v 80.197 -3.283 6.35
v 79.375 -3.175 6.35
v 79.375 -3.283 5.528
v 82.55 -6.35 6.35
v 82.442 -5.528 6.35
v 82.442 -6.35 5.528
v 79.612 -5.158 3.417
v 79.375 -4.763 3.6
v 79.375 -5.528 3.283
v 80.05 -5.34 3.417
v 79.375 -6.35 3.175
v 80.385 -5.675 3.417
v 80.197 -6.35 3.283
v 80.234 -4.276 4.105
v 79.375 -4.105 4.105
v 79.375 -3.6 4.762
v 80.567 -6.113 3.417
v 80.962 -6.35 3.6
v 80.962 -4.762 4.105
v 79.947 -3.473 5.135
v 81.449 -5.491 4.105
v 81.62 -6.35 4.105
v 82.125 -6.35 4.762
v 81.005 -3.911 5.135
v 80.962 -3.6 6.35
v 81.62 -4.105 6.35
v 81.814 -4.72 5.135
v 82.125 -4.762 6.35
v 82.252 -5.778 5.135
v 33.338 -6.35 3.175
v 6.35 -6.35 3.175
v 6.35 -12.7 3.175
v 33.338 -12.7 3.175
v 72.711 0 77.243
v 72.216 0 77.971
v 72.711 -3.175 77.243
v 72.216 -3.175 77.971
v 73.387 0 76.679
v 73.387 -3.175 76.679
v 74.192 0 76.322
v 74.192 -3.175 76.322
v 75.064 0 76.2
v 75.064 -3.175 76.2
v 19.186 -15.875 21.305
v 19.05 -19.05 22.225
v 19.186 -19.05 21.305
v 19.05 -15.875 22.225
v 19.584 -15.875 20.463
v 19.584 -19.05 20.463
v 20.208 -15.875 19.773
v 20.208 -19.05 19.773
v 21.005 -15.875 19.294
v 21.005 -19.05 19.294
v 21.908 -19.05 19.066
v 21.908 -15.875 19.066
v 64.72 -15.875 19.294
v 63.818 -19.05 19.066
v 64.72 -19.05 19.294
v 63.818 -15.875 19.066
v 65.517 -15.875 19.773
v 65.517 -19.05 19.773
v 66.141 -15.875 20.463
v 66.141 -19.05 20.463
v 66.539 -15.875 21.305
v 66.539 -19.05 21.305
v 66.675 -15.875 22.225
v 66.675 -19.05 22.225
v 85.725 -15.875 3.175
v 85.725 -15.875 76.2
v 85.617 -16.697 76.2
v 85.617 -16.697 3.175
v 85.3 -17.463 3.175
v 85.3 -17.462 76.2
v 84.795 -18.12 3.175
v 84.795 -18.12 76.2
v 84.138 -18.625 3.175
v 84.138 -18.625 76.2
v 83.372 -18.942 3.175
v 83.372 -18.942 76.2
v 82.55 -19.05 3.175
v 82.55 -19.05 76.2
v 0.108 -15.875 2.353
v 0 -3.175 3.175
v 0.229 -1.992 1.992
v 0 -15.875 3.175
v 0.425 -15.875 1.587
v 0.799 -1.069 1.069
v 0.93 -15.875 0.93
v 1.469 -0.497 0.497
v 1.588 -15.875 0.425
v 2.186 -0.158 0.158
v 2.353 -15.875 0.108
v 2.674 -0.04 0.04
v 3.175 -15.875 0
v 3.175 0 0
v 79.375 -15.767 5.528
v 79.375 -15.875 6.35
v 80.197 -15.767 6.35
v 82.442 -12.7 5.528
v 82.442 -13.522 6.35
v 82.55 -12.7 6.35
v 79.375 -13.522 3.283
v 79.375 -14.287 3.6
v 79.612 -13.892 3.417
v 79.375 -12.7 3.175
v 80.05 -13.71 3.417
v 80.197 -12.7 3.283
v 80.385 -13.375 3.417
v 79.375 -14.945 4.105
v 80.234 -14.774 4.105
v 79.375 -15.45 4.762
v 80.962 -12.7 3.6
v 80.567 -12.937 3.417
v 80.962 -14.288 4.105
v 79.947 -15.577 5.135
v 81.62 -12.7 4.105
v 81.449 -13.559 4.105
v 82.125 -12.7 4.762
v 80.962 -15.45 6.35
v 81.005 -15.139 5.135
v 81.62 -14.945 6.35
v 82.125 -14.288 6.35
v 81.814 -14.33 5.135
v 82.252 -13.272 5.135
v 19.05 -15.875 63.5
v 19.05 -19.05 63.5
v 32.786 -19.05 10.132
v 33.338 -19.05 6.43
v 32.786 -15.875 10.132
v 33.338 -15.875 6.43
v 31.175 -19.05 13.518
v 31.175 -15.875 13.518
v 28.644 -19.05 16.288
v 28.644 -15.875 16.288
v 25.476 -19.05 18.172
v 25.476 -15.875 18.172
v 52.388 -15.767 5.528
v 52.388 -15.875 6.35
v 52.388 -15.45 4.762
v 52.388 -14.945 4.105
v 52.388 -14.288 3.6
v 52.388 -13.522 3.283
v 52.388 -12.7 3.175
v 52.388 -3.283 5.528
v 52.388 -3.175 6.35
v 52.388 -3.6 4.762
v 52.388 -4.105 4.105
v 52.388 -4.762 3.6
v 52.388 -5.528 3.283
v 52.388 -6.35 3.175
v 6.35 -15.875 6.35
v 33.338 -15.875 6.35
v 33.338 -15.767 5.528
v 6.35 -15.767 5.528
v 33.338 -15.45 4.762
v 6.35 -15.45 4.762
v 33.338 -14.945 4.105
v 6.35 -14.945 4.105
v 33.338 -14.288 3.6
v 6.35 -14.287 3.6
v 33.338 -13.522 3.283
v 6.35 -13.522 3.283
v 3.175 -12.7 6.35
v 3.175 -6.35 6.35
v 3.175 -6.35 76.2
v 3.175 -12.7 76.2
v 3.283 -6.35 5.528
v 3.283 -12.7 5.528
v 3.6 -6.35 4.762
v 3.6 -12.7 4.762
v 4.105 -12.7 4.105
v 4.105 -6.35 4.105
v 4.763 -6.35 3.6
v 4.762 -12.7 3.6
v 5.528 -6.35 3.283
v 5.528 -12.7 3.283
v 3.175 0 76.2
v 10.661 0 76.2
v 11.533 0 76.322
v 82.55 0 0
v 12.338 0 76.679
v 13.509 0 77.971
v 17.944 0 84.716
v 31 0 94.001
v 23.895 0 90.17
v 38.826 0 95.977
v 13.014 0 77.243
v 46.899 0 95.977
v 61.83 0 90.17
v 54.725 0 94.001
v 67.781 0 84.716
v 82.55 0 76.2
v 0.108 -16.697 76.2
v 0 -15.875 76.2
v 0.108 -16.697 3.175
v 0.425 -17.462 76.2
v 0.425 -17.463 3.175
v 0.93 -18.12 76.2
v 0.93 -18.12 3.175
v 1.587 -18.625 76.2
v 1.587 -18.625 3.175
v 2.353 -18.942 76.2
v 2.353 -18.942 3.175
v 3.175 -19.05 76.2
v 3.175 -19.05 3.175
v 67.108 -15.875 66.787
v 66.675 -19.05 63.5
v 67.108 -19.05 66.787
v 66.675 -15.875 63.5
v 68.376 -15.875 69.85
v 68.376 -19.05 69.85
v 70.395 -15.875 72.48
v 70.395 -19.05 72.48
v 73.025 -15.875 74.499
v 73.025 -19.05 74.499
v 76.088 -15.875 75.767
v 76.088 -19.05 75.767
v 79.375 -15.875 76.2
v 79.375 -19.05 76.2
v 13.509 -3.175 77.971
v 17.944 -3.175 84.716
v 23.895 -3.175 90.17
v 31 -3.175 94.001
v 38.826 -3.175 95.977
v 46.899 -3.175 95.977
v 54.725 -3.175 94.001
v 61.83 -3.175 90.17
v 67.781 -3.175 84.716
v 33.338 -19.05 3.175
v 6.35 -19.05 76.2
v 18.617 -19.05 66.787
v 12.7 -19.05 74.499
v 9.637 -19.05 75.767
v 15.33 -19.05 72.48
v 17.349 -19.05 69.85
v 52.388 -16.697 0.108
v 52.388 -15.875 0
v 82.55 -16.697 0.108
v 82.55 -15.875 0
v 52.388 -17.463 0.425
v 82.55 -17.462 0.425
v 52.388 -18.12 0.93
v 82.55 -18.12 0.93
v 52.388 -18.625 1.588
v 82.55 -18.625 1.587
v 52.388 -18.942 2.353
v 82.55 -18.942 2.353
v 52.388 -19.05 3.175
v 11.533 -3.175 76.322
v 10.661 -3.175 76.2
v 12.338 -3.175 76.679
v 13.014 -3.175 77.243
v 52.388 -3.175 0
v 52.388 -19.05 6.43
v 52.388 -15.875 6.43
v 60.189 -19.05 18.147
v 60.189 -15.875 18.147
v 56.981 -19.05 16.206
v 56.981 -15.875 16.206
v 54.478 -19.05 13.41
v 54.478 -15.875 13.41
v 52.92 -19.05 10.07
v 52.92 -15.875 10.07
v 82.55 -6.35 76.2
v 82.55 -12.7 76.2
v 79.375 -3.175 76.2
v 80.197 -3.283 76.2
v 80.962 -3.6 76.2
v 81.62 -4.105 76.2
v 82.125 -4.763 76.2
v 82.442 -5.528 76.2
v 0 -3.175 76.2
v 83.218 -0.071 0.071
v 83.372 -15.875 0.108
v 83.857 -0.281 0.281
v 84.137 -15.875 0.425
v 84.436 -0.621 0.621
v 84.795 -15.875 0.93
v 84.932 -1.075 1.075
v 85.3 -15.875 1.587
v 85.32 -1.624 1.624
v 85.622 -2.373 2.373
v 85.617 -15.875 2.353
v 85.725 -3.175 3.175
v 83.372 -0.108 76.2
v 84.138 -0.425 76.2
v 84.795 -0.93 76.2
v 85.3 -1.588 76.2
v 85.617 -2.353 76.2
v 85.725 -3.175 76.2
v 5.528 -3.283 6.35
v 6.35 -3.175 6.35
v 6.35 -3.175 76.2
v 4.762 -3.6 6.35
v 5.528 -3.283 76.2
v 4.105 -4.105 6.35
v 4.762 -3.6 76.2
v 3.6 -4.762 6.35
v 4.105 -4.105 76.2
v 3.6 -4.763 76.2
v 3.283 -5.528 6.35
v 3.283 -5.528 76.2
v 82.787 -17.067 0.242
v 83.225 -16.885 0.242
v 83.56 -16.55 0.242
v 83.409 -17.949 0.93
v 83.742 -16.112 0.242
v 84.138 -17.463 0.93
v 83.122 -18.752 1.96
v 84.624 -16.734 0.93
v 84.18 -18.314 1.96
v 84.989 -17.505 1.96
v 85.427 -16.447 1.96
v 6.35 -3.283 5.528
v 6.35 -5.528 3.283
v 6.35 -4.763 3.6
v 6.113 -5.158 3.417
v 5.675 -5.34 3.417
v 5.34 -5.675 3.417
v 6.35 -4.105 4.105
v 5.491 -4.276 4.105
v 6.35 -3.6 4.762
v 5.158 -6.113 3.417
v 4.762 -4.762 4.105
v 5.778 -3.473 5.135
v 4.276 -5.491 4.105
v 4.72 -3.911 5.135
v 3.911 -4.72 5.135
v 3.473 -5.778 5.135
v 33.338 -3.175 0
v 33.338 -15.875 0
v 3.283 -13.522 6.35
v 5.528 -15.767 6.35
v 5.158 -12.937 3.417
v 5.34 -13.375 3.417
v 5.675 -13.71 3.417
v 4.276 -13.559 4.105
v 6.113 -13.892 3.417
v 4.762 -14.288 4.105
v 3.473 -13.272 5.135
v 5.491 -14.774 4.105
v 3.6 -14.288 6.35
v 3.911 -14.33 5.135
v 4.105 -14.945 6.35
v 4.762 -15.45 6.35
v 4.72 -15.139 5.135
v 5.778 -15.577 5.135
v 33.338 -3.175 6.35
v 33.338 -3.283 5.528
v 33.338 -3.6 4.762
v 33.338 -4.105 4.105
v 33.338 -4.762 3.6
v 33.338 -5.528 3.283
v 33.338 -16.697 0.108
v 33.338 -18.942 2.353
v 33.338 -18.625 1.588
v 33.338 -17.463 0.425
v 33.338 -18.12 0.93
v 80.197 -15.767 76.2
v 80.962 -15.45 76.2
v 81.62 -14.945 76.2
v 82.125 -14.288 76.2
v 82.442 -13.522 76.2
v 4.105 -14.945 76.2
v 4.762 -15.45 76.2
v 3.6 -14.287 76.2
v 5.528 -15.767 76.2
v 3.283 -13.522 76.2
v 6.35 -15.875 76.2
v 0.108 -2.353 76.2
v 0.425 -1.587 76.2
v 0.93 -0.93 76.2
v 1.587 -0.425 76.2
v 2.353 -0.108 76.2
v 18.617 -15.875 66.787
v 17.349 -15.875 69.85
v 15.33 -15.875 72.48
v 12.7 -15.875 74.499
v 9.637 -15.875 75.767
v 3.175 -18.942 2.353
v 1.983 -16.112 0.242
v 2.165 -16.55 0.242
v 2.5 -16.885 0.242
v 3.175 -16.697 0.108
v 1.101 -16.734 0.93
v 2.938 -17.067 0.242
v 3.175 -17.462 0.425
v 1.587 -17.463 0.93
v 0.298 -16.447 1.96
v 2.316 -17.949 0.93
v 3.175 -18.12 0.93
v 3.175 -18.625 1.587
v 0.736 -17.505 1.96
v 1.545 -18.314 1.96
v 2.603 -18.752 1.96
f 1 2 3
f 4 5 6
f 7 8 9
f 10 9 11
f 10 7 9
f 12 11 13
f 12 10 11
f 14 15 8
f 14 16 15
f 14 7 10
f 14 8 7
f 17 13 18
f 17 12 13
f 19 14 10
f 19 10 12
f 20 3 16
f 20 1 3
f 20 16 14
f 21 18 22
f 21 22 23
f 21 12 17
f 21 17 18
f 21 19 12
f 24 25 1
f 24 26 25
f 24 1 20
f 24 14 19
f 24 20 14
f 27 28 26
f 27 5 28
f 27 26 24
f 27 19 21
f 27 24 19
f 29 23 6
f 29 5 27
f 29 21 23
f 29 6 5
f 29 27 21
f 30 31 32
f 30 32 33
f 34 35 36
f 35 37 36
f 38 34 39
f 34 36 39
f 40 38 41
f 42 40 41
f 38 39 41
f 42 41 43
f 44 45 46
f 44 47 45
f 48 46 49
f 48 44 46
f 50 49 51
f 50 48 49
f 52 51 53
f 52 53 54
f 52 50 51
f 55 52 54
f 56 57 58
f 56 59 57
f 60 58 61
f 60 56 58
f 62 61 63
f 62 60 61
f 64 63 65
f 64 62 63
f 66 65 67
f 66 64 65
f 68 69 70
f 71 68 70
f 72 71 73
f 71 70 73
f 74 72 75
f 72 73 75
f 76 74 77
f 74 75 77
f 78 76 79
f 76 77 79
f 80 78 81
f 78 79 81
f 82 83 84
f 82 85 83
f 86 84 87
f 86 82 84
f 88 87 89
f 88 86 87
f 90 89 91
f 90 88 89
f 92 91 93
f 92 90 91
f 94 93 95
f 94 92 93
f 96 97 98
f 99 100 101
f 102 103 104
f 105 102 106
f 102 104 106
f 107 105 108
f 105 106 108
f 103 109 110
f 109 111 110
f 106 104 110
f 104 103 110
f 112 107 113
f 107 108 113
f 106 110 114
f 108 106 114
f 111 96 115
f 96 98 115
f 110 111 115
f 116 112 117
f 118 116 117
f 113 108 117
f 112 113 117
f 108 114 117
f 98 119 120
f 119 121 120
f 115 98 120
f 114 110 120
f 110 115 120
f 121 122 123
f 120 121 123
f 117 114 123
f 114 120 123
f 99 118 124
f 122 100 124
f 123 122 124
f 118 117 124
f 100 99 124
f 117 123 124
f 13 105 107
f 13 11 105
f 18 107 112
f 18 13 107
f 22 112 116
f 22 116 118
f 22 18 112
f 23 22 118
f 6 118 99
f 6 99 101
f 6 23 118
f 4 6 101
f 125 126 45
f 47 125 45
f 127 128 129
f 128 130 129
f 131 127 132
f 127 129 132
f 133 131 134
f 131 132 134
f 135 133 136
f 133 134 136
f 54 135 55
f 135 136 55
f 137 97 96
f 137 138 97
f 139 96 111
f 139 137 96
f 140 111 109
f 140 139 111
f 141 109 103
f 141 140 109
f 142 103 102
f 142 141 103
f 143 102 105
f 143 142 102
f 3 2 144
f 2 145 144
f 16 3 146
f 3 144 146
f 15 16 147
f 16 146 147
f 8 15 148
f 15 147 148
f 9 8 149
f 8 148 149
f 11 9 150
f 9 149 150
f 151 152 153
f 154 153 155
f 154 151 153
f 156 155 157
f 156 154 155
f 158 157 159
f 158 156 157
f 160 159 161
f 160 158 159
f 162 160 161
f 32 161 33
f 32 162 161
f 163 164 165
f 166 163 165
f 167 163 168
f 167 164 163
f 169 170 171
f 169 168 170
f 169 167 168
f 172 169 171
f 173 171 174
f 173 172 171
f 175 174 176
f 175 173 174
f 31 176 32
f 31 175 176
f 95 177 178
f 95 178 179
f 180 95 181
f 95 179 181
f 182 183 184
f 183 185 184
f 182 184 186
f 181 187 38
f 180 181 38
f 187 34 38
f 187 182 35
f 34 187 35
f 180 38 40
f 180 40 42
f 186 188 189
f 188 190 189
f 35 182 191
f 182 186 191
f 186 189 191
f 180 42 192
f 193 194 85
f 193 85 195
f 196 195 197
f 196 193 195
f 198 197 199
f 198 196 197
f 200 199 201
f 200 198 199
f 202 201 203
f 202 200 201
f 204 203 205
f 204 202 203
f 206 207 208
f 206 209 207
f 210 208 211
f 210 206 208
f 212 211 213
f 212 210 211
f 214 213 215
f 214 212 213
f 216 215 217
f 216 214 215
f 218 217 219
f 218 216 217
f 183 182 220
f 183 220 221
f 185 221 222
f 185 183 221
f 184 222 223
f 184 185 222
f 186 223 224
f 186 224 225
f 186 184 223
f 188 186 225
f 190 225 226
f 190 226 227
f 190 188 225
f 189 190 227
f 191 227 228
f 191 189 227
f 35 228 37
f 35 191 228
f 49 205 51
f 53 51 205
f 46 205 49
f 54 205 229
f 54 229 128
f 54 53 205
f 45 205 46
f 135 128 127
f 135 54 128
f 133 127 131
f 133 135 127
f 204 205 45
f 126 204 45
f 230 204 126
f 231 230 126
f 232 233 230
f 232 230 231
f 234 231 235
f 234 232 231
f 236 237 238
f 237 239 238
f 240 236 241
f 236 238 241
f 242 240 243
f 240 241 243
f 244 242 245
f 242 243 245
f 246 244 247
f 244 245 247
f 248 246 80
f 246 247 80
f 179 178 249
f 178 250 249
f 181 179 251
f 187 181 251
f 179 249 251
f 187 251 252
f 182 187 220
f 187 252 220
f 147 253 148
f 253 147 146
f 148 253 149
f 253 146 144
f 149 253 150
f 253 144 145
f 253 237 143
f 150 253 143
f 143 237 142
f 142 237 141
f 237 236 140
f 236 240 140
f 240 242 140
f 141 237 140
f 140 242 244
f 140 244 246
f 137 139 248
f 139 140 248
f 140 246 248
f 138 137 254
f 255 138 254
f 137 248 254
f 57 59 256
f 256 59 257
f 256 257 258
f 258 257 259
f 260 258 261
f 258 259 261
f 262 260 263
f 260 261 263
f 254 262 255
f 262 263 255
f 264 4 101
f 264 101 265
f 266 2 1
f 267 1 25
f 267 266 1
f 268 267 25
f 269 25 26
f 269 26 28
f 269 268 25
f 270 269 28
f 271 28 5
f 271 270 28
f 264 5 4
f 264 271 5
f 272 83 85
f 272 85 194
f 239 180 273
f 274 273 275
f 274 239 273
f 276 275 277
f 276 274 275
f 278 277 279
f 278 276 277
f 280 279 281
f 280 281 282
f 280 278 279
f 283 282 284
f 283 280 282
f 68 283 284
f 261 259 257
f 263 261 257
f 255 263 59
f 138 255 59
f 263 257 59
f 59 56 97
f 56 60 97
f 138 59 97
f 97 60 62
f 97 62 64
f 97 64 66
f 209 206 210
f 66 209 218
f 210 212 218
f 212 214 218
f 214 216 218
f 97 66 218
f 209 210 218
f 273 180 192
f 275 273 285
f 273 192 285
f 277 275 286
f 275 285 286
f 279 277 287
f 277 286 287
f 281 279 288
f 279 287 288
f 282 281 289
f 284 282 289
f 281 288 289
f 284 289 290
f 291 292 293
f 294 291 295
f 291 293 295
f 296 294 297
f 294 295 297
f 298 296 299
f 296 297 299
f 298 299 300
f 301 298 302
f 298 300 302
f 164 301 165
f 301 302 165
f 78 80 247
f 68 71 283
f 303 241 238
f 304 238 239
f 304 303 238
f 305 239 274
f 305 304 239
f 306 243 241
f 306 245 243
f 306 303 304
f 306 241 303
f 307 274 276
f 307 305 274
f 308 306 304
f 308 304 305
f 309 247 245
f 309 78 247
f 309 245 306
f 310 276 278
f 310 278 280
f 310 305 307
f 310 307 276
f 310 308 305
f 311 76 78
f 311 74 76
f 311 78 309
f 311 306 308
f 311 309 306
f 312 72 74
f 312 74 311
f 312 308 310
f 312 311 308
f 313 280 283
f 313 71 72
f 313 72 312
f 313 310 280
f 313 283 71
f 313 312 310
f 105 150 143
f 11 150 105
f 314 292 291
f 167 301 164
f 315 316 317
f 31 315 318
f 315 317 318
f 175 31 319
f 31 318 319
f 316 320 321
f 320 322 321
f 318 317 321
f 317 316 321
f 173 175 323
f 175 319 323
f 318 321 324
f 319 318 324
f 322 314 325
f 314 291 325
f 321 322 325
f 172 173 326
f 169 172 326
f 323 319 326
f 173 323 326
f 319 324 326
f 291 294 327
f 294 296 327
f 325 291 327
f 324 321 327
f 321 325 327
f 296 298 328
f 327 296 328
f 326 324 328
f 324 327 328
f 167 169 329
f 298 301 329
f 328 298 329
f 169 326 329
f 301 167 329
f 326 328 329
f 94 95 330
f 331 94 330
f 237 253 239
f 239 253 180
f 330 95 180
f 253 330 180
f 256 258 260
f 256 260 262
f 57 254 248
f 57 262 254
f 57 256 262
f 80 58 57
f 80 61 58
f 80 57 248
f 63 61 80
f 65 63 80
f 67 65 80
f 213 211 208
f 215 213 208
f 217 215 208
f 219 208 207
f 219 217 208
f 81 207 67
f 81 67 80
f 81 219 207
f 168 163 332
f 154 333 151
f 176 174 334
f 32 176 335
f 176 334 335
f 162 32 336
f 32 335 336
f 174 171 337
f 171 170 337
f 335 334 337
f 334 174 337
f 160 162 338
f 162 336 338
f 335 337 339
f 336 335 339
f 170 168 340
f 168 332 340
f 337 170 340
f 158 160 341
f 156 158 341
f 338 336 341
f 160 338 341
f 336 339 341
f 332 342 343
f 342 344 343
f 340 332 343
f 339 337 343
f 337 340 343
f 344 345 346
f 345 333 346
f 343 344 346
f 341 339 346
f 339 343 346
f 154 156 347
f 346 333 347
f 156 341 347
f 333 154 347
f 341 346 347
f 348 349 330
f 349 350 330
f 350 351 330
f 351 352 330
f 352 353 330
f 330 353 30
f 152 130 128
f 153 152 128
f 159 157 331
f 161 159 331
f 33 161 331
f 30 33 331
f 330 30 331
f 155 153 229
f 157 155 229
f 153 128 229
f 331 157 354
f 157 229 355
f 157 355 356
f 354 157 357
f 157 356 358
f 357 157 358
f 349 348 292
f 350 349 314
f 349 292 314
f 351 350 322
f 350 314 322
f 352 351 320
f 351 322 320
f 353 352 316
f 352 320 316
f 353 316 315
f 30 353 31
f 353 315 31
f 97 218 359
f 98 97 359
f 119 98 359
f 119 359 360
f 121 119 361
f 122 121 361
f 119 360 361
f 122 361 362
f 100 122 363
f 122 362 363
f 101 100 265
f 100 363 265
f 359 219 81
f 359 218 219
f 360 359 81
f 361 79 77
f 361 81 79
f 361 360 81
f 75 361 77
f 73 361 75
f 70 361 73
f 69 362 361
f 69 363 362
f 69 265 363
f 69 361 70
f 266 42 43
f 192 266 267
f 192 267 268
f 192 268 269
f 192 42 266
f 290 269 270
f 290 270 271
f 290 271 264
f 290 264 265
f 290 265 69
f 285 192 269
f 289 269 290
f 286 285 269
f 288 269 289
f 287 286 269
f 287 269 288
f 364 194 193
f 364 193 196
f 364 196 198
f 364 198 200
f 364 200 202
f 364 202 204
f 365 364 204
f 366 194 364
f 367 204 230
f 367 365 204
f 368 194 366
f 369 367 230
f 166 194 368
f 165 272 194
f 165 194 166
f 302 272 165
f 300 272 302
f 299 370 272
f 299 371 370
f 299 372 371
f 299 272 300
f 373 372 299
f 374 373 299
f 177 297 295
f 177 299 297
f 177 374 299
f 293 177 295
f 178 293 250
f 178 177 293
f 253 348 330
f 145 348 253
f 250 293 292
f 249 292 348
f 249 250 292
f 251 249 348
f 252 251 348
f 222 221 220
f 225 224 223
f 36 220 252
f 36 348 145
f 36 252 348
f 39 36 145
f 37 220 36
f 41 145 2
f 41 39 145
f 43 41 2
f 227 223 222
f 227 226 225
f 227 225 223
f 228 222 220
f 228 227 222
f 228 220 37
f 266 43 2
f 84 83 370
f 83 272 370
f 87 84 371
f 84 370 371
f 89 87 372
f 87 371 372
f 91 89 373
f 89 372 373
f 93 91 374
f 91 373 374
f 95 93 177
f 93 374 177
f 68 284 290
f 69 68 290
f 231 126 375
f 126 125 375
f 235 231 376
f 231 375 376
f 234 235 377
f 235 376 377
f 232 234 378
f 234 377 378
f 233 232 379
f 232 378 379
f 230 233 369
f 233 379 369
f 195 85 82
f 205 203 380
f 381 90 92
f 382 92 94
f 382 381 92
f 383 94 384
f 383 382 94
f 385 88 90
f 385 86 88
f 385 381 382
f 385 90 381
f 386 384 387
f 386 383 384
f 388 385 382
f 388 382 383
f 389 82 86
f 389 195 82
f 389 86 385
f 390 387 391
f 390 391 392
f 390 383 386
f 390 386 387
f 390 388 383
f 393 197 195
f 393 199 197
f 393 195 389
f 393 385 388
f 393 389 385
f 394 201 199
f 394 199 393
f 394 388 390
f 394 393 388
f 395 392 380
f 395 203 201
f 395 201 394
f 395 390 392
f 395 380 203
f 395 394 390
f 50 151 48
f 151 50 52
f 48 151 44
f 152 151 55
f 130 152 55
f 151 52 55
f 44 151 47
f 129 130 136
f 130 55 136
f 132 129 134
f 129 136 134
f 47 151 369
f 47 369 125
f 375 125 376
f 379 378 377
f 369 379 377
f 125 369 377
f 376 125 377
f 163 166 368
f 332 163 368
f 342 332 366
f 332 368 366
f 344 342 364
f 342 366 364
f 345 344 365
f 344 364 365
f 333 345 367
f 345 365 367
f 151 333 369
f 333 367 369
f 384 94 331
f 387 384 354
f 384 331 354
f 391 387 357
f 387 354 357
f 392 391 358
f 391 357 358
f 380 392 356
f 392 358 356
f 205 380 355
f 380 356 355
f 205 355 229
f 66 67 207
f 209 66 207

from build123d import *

# Parameters (mm, degrees)
F0_W     = 85.725
F0_H     = 76.2
F1_DEPTH = 19.05
F2_T     = -3.175
F4_DEPTH = 15.875
F6_DEPTH = 3.175
F7_R     = 3.175
F8_R     = 12.7


with BuildPart() as f1:
    # F0 (on Front) → F1 (new body)
    with BuildSketch(Plane.XZ):
        with Locations((42.8625, 38.1)):
            Rectangle(F0_W, F0_H)
    extrude(amount=F1_DEPTH)

    # F2
    f2_openings = [f1.faces().sort_by_distance(p)[0] for p in [
        (42.8625, -9.525, 76.2),
    ]]
    offset(amount=F2_T, openings=f2_openings)

    # F3 (on face) → F4 (cut, through all)
    with BuildSketch(Plane.XZ.offset(19.05)):
        Polygon((42.8625, 76.2), (19.05, 76.2), (19.05, 19.05), (33.3375, 19.05), (33.3375, 0), (42.8625, 0), align=None)
        Polygon((66.675, 76.2), (42.8625, 76.2), (42.8625, 0), (52.3875, 0), (52.3875, 19.05), (66.675, 19.05), align=None)
    extrude(amount=-F4_DEPTH, mode=Mode.SUBTRACT)

    # F5 (on face) → F6 (join, through all)
    with BuildSketch(Plane(origin=(0, 0, 0), x_dir=(-1, 0, 0), z_dir=(0, 1, 0))):
        with BuildLine():
            Line((-73.025, 76.2), (-12.7, 76.2))
            ThreePointArc((-12.7, 76.2), (-42.8625, 96.2271509033), (-73.025, 76.2))
        make_face()
    extrude(amount=-F6_DEPTH)

    # F7
    f7_edges = [f1.edges().sort_by_distance(p)[0] for p in [
        (3.175, -3.175, 39.6875),
        (3.175, -15.875, 39.6875),
        (12.7, -1.5875, 76.2),
        (73.025, -1.5875, 76.2),
        (82.55, -3.175, 39.6875),
        (82.55, -15.875, 39.6875),
        (66.675, -17.4625, 19.05),
        (19.05, -17.4625, 19.05),
        (18.25625, -3.175, 3.175),
        (3.175, -9.525, 3.175),
        (18.25625, -15.875, 3.175),
        (67.46875, -3.175, 3.175),
        (67.46875, -15.875, 3.175),
        (82.55, -9.525, 3.175),
        (85.725, -19.05, 38.1),
        (85.725, 0, 38.1),
        (0, 0, 38.1),
        (0, -19.05, 38.1),
        (0, -9.525, 0),
        (69.05625, -19.05, 0),
        (16.66875, -19.05, 0),
        (85.725, -9.525, 0),
    ]]
    fillet(f7_edges, radius=F7_R)

    # F8
    f8_edges = [f1.edges().sort_by_distance(p)[0] for p in [
        (19.05, -17.4625, 76.2),
        (66.675, -17.4625, 76.2),
        (52.3875, -17.4625, 19.05),
        (33.3375, -17.4625, 19.05),
    ]]
    fillet(f8_edges, radius=F8_R)


solid = f1.part
